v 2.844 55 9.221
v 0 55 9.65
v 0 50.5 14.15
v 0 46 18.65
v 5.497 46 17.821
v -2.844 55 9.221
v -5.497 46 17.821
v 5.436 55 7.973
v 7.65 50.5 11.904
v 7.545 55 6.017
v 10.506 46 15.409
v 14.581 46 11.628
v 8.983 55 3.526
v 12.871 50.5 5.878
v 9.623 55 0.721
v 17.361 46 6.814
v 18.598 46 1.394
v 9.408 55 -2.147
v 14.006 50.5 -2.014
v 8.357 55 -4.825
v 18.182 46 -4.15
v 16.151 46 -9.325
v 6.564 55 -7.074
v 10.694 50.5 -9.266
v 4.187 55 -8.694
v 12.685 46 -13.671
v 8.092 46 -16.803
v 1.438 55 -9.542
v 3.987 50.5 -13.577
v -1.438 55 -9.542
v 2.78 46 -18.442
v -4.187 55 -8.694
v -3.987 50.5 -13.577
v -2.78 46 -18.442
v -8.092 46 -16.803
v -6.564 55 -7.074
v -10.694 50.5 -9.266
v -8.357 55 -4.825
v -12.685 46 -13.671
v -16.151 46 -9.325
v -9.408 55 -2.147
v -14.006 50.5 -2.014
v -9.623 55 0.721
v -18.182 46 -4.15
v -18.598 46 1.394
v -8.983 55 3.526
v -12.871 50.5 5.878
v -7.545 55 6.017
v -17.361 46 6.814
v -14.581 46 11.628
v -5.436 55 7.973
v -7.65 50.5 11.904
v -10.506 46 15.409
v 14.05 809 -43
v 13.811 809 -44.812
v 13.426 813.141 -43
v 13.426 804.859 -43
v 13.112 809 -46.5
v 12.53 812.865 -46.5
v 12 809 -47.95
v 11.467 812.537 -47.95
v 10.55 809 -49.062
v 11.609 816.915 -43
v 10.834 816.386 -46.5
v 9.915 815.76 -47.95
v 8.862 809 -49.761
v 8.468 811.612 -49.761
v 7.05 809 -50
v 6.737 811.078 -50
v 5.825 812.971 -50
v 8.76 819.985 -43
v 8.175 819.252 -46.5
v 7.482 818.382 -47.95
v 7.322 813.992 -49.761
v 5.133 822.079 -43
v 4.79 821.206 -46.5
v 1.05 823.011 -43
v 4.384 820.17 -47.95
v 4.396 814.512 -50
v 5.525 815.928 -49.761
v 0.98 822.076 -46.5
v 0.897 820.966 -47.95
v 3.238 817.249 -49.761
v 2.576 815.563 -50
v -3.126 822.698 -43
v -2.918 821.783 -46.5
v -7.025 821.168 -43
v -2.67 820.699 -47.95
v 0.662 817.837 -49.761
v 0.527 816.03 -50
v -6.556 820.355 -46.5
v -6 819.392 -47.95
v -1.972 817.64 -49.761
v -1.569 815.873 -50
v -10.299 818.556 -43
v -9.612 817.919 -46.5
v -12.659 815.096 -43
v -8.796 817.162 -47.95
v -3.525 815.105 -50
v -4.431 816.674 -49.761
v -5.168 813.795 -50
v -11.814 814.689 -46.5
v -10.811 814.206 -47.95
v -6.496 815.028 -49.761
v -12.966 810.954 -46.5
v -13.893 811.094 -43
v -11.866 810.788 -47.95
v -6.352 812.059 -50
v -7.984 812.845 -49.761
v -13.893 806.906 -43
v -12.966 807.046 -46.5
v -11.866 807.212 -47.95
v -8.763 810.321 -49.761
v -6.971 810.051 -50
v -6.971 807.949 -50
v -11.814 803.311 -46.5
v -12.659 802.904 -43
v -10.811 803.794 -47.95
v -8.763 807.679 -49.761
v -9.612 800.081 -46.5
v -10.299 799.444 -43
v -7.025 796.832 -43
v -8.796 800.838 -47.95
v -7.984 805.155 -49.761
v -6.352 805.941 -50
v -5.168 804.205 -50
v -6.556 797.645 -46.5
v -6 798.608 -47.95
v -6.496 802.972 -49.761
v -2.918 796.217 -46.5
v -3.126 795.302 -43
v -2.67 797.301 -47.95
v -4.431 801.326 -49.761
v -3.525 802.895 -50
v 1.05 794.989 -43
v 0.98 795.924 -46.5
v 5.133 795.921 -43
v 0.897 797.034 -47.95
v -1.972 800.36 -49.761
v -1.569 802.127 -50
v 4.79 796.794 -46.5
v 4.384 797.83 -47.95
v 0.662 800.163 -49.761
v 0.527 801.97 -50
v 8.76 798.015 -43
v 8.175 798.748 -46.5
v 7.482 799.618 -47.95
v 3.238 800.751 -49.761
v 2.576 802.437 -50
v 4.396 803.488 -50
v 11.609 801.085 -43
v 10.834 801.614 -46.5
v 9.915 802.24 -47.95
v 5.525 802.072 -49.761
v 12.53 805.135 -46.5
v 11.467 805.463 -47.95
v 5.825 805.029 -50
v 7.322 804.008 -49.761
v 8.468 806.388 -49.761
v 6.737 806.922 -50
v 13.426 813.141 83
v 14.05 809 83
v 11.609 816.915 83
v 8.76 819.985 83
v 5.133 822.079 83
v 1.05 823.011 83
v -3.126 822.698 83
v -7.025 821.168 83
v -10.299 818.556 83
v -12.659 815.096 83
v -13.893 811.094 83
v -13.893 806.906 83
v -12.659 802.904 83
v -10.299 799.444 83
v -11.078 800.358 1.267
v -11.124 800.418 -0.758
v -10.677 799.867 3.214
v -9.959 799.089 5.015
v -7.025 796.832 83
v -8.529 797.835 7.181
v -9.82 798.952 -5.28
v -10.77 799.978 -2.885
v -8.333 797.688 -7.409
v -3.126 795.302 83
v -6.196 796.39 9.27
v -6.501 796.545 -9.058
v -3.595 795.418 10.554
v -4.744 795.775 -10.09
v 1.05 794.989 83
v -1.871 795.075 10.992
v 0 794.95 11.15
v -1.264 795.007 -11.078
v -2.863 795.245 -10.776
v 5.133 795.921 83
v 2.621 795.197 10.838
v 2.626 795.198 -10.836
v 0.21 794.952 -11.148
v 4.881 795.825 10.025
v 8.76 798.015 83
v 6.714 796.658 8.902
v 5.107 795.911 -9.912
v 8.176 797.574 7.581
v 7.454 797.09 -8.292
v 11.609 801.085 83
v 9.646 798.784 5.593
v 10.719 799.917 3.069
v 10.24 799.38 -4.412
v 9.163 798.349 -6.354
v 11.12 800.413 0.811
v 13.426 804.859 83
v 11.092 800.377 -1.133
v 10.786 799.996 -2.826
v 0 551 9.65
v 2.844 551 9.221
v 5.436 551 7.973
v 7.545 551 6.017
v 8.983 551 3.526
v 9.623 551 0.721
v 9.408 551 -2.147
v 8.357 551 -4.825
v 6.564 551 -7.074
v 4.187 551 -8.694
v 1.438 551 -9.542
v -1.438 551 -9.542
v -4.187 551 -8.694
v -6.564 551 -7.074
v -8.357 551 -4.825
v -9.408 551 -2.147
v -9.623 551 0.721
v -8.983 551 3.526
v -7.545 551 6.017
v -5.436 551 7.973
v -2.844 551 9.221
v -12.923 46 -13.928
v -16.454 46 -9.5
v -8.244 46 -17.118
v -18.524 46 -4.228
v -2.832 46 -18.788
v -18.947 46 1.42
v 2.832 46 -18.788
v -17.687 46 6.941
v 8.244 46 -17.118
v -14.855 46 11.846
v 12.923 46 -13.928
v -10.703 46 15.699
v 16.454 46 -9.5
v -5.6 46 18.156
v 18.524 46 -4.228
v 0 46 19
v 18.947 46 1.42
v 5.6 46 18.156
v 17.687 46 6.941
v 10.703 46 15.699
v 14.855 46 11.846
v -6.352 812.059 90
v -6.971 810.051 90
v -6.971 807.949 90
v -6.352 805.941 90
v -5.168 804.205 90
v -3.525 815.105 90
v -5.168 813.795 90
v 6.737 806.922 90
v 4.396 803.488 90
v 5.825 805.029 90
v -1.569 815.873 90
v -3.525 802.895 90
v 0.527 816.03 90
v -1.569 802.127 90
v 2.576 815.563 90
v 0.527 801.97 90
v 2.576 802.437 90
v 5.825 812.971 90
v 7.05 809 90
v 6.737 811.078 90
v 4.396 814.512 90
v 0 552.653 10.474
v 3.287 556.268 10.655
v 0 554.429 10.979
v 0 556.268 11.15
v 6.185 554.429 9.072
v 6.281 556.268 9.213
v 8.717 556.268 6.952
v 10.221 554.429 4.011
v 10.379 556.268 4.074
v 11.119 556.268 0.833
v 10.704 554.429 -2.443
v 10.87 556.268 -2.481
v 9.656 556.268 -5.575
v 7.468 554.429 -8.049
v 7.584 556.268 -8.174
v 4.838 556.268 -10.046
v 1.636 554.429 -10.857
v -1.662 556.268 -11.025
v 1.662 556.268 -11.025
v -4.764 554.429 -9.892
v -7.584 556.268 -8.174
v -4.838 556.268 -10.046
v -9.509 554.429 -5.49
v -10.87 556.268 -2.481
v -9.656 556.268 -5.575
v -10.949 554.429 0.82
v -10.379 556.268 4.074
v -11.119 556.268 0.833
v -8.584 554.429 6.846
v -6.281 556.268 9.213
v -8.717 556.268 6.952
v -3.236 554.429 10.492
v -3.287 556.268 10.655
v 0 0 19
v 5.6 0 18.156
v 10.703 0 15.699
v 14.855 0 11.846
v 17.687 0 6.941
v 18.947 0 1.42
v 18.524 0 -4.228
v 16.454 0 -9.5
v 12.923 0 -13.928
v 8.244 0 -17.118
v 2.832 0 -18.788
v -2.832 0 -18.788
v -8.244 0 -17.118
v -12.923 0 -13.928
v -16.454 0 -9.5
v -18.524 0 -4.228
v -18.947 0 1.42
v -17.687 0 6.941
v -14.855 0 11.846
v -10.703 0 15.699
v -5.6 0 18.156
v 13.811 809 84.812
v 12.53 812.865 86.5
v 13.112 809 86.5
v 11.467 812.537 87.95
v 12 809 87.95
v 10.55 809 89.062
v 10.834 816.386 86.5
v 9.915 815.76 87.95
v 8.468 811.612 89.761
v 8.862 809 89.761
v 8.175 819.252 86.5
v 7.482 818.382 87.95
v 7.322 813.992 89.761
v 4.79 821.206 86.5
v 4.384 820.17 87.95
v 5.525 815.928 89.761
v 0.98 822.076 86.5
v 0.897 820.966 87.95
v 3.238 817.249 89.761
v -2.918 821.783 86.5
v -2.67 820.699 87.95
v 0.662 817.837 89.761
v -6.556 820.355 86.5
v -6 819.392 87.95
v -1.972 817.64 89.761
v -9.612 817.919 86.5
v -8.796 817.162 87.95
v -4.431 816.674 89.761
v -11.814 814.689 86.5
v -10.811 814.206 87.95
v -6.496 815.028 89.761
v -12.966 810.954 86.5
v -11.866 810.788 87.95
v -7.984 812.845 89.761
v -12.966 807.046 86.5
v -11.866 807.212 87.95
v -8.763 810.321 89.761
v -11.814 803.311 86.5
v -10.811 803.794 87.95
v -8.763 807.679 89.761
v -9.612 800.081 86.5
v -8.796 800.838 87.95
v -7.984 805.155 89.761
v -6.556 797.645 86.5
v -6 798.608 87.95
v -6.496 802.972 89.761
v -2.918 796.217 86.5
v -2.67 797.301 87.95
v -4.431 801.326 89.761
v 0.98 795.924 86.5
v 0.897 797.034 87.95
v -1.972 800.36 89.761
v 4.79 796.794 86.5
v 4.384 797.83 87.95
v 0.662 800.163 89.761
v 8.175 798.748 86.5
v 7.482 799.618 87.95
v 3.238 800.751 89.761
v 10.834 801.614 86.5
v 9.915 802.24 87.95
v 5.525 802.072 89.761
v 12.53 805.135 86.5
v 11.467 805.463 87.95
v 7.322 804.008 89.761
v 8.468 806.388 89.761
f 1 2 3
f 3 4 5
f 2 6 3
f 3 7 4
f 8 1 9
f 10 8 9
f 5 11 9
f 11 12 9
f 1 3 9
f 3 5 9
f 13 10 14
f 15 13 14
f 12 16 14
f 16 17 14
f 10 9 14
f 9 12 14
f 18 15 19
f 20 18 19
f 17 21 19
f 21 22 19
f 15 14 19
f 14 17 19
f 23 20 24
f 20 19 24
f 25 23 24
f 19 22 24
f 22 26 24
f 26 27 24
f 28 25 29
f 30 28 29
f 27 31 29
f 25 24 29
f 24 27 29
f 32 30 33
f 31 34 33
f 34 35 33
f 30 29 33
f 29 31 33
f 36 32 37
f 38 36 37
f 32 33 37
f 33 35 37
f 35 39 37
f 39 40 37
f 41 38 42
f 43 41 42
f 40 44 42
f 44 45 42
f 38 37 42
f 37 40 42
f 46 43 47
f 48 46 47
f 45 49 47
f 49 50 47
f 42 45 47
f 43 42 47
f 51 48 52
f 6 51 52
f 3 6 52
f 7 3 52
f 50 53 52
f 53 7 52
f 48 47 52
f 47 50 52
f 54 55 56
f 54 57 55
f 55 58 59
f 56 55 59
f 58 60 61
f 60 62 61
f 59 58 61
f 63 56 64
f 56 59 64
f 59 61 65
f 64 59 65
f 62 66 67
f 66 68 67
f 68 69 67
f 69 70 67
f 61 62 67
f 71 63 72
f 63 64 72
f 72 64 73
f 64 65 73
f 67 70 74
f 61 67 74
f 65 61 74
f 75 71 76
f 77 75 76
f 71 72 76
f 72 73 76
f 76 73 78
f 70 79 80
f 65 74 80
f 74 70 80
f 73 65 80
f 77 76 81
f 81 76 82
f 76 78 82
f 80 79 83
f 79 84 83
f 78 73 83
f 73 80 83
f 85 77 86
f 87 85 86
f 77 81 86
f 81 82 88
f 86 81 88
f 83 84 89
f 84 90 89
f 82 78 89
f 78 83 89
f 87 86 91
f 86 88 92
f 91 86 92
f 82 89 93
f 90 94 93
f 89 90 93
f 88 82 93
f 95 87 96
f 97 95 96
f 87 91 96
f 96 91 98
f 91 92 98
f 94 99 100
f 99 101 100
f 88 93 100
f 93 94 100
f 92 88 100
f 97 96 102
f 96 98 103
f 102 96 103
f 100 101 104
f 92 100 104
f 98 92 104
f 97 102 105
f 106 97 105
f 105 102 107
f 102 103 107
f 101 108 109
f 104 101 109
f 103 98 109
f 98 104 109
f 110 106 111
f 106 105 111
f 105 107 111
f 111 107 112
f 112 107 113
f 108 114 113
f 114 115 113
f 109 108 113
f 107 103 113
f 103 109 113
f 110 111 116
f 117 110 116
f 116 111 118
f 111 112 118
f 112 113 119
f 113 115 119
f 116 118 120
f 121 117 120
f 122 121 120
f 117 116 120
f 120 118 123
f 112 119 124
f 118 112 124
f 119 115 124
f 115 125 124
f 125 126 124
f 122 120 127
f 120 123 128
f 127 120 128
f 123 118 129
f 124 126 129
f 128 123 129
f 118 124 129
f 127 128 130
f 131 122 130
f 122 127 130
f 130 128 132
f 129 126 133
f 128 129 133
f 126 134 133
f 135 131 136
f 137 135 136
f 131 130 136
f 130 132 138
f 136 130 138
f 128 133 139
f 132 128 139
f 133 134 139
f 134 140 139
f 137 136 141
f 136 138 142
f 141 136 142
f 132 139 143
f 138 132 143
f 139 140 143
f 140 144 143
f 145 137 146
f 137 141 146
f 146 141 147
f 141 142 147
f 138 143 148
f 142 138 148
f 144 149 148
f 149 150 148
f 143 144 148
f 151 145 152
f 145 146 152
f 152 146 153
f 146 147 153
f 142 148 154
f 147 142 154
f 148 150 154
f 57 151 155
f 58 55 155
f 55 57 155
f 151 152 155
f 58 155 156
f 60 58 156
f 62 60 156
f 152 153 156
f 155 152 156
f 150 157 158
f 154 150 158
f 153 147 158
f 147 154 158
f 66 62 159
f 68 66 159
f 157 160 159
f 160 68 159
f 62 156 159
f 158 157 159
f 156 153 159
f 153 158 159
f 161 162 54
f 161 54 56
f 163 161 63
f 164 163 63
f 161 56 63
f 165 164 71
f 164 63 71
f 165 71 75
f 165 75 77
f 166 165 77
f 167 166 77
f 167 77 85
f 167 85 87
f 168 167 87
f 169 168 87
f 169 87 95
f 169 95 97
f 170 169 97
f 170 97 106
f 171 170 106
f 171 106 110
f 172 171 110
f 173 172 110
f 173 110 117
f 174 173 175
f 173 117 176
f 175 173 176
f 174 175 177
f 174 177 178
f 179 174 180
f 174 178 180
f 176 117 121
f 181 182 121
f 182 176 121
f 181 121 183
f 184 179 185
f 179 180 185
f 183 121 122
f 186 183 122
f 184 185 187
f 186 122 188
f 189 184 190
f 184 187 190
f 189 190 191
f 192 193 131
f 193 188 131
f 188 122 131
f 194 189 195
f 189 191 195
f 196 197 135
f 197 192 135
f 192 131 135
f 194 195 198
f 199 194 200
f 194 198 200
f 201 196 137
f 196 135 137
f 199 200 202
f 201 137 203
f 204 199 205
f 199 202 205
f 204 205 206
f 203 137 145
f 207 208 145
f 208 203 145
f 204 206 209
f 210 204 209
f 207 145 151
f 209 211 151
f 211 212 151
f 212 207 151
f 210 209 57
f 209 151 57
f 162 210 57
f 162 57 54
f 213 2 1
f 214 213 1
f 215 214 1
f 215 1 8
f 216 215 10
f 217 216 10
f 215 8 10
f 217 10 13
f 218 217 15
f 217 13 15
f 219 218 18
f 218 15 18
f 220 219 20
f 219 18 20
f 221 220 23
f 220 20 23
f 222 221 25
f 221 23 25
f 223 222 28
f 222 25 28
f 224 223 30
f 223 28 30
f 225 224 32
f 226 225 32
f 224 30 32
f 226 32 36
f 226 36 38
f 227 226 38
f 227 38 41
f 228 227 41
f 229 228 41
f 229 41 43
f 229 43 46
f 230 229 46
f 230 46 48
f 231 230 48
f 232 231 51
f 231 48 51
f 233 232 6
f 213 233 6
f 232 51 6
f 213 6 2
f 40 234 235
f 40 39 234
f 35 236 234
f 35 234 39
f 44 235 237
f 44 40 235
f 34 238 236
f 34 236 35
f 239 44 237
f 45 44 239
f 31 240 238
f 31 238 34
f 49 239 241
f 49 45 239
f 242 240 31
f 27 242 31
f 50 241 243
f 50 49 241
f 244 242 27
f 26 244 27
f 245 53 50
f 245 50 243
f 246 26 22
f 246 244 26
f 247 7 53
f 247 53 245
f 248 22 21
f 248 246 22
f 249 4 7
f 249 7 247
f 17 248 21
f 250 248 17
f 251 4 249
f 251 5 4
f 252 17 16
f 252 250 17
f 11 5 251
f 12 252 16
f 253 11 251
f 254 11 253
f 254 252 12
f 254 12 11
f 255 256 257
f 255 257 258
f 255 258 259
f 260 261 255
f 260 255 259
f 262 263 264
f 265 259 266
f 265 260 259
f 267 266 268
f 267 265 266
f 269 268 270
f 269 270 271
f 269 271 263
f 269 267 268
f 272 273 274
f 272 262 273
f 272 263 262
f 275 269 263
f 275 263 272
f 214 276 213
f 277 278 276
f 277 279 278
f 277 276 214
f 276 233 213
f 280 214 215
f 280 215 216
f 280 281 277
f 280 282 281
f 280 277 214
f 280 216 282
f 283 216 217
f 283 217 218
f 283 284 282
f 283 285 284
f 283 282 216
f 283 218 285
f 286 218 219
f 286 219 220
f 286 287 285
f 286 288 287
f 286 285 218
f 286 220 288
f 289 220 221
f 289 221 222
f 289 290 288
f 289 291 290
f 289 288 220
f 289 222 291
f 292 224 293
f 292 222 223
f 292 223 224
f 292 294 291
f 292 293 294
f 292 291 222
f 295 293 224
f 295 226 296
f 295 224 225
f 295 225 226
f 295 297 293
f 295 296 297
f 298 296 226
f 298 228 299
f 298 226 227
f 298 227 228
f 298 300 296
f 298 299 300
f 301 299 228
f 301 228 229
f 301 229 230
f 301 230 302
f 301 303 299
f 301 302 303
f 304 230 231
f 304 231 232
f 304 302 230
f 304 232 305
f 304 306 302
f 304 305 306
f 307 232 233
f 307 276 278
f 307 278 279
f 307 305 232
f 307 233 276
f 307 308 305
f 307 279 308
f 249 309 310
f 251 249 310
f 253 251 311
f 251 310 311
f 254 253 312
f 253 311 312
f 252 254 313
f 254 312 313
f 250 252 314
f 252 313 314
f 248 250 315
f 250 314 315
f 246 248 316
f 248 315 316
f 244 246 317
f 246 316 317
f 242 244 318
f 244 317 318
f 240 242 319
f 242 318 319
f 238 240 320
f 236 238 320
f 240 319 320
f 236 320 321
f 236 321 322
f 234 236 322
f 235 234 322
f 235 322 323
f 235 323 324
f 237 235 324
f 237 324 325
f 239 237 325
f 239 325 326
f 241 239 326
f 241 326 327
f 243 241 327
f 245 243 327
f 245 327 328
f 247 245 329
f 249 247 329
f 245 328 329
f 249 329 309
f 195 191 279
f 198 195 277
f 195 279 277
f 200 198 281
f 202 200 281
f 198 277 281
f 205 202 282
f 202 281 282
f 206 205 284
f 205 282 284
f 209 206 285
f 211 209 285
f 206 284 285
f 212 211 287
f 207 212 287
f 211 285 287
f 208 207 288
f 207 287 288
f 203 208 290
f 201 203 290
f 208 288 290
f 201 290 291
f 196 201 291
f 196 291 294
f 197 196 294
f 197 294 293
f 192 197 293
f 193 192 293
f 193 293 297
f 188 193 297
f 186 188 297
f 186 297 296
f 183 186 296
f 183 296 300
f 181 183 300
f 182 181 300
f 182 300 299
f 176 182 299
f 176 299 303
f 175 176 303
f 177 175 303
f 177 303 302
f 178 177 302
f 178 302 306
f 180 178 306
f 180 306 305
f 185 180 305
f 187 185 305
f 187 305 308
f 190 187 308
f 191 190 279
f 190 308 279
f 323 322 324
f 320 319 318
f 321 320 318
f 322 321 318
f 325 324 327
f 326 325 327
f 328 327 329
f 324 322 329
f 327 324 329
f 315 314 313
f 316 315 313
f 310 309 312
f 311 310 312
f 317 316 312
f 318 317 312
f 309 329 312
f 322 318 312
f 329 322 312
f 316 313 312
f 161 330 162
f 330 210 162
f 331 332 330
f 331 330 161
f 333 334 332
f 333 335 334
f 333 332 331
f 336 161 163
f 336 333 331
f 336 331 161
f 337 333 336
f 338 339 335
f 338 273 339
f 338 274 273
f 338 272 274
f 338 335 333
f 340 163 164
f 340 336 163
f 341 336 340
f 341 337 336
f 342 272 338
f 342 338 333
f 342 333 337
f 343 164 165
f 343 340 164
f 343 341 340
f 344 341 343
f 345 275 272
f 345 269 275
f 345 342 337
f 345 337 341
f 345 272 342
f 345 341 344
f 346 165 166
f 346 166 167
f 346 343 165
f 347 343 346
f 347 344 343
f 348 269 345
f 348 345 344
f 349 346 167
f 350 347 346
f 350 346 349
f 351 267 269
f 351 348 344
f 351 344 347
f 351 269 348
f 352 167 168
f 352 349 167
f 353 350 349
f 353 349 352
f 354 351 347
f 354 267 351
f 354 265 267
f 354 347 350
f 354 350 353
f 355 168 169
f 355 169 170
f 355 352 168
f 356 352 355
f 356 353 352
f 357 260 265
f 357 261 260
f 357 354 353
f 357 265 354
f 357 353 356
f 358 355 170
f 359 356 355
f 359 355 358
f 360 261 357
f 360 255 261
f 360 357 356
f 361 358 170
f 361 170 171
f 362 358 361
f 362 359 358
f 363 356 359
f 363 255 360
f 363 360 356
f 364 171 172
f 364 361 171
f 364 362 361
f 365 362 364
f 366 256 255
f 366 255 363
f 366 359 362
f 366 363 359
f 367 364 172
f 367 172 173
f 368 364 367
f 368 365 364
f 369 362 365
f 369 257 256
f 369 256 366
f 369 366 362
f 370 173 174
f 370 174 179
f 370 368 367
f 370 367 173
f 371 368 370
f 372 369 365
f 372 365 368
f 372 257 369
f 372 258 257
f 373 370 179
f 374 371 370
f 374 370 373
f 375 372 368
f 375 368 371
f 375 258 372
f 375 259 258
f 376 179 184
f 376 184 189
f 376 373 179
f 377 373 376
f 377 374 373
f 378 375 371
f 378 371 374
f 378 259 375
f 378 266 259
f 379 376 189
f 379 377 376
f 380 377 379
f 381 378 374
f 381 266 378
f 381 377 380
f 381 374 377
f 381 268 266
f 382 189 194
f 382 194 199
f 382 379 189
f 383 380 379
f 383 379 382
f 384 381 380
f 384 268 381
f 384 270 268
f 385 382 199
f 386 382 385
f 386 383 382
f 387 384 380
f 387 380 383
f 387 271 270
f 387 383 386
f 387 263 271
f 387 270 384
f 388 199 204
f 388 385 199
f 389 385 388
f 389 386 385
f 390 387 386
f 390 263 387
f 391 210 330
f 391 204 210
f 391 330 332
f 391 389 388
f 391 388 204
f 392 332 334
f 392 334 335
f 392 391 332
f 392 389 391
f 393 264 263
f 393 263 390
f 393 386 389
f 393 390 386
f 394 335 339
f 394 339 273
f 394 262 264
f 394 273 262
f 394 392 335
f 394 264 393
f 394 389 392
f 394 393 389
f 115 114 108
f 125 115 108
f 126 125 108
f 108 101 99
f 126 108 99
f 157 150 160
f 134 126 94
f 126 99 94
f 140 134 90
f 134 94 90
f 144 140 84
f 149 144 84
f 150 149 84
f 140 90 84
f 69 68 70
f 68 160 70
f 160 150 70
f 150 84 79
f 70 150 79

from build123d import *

# Parameters (mm, degrees)
SKETCH1_R                = 19
BOSS_EXTRUDE1_DEPTH      = 46
SKETCH2_R                = 9.65
BOSS_EXTRUDE2_DEPTH      = 505
SKETCH3_R                = 11.15
BOSS_EXTRUDE3_DEPTH      = 250
CHAMFER1_SIZE            = 9
FILLET1_R                = 10
BOSS_EXTRUDE4_DEPTH      = 90
BOSS_EXTRUDE4_DEPTH_BACK = 50
SKETCH4_R                = 14.05
FILLET2_R                = 7


with BuildPart() as part:
    # Sketch1 → Boss-Extrude1 (new body)
    with BuildSketch(Plane(origin=(0, 0, 0), x_dir=(1, 0, 0), z_dir=(0, 1, 0))):
        with Locations(Location((0, 0, 0), (0, 0, 270))):
            Circle(SKETCH1_R)
    extrude(amount=BOSS_EXTRUDE1_DEPTH)

    # Sketch2 → Boss-Extrude2 (add)
    with BuildSketch(Plane(origin=(0, 46, 0), x_dir=(1, 0, 0), z_dir=(0, 1, 0))):
        with Locations(Location((0, 0, 0), (0, 0, 270))):
            Circle(SKETCH2_R)
    extrude(amount=BOSS_EXTRUDE2_DEPTH)

    # Sketch3 → Boss-Extrude3 (add)
    with BuildSketch(Plane(origin=(0, 551, 0), x_dir=(1, 0, 0), z_dir=(0, 1, 0))):
        with Locations(Location((0, 0, 0), (0, 0, 270))):
            Circle(SKETCH3_R)
    extrude(amount=BOSS_EXTRUDE3_DEPTH)

    # Chamfer1
    chamfer1_edges = [part.edges().sort_by_distance(p)[0] for p in [
        (0, 46, -9.65),
    ]]
    chamfer(chamfer1_edges, length=CHAMFER1_SIZE)

    # Fillet1
    # the kernel refuses this fillet: 10 mm, written as the material it takes off along each edge
    with BuildSketch(Plane(origin=(0, 551, 0), x_dir=(0, 0, 1), z_dir=(-1, 0, 0))) as fillet1_piece_1:
        with BuildLine():
            CenterArc((1.15, 5.267826876), FILLET1_R, 328.211669383, 31.788330617)
            Line((11.15, 5.267826876), (11.35, 5.267826876))
            Line((11.35, 5.267826876), (11.35, 0))
            Line((11.35, 0), (11.15, -0.2))
            ThreePointArc((11.15, -0.2), (10.4, -0.2), (9.82, -0.105356538))
            Line((9.82, -0.105356538), (9.65, 0))
        make_face()
    revolve(axis=Axis((0, 551, 0), (0, 1, 0)), mode=Mode.SUBTRACT)

    # Sketch4 → Boss-Extrude4 (add, two sides: drawn at the far end of the back side and taken through both)
    with BuildSketch(Plane.XY.offset(-BOSS_EXTRUDE4_DEPTH_BACK)):
        with Locations((0, 809)):
            Circle(SKETCH4_R)
    extrude(amount=BOSS_EXTRUDE4_DEPTH + BOSS_EXTRUDE4_DEPTH_BACK)

    # Fillet2
    fillet2_edges = [part.edges().sort_by_distance(p)[0] for p in [
        (-14.05, 809, -50),
        (-14.05, 809, 90),
    ]]
    fillet(fillet2_edges, radius=FILLET2_R)


solid = part.part
